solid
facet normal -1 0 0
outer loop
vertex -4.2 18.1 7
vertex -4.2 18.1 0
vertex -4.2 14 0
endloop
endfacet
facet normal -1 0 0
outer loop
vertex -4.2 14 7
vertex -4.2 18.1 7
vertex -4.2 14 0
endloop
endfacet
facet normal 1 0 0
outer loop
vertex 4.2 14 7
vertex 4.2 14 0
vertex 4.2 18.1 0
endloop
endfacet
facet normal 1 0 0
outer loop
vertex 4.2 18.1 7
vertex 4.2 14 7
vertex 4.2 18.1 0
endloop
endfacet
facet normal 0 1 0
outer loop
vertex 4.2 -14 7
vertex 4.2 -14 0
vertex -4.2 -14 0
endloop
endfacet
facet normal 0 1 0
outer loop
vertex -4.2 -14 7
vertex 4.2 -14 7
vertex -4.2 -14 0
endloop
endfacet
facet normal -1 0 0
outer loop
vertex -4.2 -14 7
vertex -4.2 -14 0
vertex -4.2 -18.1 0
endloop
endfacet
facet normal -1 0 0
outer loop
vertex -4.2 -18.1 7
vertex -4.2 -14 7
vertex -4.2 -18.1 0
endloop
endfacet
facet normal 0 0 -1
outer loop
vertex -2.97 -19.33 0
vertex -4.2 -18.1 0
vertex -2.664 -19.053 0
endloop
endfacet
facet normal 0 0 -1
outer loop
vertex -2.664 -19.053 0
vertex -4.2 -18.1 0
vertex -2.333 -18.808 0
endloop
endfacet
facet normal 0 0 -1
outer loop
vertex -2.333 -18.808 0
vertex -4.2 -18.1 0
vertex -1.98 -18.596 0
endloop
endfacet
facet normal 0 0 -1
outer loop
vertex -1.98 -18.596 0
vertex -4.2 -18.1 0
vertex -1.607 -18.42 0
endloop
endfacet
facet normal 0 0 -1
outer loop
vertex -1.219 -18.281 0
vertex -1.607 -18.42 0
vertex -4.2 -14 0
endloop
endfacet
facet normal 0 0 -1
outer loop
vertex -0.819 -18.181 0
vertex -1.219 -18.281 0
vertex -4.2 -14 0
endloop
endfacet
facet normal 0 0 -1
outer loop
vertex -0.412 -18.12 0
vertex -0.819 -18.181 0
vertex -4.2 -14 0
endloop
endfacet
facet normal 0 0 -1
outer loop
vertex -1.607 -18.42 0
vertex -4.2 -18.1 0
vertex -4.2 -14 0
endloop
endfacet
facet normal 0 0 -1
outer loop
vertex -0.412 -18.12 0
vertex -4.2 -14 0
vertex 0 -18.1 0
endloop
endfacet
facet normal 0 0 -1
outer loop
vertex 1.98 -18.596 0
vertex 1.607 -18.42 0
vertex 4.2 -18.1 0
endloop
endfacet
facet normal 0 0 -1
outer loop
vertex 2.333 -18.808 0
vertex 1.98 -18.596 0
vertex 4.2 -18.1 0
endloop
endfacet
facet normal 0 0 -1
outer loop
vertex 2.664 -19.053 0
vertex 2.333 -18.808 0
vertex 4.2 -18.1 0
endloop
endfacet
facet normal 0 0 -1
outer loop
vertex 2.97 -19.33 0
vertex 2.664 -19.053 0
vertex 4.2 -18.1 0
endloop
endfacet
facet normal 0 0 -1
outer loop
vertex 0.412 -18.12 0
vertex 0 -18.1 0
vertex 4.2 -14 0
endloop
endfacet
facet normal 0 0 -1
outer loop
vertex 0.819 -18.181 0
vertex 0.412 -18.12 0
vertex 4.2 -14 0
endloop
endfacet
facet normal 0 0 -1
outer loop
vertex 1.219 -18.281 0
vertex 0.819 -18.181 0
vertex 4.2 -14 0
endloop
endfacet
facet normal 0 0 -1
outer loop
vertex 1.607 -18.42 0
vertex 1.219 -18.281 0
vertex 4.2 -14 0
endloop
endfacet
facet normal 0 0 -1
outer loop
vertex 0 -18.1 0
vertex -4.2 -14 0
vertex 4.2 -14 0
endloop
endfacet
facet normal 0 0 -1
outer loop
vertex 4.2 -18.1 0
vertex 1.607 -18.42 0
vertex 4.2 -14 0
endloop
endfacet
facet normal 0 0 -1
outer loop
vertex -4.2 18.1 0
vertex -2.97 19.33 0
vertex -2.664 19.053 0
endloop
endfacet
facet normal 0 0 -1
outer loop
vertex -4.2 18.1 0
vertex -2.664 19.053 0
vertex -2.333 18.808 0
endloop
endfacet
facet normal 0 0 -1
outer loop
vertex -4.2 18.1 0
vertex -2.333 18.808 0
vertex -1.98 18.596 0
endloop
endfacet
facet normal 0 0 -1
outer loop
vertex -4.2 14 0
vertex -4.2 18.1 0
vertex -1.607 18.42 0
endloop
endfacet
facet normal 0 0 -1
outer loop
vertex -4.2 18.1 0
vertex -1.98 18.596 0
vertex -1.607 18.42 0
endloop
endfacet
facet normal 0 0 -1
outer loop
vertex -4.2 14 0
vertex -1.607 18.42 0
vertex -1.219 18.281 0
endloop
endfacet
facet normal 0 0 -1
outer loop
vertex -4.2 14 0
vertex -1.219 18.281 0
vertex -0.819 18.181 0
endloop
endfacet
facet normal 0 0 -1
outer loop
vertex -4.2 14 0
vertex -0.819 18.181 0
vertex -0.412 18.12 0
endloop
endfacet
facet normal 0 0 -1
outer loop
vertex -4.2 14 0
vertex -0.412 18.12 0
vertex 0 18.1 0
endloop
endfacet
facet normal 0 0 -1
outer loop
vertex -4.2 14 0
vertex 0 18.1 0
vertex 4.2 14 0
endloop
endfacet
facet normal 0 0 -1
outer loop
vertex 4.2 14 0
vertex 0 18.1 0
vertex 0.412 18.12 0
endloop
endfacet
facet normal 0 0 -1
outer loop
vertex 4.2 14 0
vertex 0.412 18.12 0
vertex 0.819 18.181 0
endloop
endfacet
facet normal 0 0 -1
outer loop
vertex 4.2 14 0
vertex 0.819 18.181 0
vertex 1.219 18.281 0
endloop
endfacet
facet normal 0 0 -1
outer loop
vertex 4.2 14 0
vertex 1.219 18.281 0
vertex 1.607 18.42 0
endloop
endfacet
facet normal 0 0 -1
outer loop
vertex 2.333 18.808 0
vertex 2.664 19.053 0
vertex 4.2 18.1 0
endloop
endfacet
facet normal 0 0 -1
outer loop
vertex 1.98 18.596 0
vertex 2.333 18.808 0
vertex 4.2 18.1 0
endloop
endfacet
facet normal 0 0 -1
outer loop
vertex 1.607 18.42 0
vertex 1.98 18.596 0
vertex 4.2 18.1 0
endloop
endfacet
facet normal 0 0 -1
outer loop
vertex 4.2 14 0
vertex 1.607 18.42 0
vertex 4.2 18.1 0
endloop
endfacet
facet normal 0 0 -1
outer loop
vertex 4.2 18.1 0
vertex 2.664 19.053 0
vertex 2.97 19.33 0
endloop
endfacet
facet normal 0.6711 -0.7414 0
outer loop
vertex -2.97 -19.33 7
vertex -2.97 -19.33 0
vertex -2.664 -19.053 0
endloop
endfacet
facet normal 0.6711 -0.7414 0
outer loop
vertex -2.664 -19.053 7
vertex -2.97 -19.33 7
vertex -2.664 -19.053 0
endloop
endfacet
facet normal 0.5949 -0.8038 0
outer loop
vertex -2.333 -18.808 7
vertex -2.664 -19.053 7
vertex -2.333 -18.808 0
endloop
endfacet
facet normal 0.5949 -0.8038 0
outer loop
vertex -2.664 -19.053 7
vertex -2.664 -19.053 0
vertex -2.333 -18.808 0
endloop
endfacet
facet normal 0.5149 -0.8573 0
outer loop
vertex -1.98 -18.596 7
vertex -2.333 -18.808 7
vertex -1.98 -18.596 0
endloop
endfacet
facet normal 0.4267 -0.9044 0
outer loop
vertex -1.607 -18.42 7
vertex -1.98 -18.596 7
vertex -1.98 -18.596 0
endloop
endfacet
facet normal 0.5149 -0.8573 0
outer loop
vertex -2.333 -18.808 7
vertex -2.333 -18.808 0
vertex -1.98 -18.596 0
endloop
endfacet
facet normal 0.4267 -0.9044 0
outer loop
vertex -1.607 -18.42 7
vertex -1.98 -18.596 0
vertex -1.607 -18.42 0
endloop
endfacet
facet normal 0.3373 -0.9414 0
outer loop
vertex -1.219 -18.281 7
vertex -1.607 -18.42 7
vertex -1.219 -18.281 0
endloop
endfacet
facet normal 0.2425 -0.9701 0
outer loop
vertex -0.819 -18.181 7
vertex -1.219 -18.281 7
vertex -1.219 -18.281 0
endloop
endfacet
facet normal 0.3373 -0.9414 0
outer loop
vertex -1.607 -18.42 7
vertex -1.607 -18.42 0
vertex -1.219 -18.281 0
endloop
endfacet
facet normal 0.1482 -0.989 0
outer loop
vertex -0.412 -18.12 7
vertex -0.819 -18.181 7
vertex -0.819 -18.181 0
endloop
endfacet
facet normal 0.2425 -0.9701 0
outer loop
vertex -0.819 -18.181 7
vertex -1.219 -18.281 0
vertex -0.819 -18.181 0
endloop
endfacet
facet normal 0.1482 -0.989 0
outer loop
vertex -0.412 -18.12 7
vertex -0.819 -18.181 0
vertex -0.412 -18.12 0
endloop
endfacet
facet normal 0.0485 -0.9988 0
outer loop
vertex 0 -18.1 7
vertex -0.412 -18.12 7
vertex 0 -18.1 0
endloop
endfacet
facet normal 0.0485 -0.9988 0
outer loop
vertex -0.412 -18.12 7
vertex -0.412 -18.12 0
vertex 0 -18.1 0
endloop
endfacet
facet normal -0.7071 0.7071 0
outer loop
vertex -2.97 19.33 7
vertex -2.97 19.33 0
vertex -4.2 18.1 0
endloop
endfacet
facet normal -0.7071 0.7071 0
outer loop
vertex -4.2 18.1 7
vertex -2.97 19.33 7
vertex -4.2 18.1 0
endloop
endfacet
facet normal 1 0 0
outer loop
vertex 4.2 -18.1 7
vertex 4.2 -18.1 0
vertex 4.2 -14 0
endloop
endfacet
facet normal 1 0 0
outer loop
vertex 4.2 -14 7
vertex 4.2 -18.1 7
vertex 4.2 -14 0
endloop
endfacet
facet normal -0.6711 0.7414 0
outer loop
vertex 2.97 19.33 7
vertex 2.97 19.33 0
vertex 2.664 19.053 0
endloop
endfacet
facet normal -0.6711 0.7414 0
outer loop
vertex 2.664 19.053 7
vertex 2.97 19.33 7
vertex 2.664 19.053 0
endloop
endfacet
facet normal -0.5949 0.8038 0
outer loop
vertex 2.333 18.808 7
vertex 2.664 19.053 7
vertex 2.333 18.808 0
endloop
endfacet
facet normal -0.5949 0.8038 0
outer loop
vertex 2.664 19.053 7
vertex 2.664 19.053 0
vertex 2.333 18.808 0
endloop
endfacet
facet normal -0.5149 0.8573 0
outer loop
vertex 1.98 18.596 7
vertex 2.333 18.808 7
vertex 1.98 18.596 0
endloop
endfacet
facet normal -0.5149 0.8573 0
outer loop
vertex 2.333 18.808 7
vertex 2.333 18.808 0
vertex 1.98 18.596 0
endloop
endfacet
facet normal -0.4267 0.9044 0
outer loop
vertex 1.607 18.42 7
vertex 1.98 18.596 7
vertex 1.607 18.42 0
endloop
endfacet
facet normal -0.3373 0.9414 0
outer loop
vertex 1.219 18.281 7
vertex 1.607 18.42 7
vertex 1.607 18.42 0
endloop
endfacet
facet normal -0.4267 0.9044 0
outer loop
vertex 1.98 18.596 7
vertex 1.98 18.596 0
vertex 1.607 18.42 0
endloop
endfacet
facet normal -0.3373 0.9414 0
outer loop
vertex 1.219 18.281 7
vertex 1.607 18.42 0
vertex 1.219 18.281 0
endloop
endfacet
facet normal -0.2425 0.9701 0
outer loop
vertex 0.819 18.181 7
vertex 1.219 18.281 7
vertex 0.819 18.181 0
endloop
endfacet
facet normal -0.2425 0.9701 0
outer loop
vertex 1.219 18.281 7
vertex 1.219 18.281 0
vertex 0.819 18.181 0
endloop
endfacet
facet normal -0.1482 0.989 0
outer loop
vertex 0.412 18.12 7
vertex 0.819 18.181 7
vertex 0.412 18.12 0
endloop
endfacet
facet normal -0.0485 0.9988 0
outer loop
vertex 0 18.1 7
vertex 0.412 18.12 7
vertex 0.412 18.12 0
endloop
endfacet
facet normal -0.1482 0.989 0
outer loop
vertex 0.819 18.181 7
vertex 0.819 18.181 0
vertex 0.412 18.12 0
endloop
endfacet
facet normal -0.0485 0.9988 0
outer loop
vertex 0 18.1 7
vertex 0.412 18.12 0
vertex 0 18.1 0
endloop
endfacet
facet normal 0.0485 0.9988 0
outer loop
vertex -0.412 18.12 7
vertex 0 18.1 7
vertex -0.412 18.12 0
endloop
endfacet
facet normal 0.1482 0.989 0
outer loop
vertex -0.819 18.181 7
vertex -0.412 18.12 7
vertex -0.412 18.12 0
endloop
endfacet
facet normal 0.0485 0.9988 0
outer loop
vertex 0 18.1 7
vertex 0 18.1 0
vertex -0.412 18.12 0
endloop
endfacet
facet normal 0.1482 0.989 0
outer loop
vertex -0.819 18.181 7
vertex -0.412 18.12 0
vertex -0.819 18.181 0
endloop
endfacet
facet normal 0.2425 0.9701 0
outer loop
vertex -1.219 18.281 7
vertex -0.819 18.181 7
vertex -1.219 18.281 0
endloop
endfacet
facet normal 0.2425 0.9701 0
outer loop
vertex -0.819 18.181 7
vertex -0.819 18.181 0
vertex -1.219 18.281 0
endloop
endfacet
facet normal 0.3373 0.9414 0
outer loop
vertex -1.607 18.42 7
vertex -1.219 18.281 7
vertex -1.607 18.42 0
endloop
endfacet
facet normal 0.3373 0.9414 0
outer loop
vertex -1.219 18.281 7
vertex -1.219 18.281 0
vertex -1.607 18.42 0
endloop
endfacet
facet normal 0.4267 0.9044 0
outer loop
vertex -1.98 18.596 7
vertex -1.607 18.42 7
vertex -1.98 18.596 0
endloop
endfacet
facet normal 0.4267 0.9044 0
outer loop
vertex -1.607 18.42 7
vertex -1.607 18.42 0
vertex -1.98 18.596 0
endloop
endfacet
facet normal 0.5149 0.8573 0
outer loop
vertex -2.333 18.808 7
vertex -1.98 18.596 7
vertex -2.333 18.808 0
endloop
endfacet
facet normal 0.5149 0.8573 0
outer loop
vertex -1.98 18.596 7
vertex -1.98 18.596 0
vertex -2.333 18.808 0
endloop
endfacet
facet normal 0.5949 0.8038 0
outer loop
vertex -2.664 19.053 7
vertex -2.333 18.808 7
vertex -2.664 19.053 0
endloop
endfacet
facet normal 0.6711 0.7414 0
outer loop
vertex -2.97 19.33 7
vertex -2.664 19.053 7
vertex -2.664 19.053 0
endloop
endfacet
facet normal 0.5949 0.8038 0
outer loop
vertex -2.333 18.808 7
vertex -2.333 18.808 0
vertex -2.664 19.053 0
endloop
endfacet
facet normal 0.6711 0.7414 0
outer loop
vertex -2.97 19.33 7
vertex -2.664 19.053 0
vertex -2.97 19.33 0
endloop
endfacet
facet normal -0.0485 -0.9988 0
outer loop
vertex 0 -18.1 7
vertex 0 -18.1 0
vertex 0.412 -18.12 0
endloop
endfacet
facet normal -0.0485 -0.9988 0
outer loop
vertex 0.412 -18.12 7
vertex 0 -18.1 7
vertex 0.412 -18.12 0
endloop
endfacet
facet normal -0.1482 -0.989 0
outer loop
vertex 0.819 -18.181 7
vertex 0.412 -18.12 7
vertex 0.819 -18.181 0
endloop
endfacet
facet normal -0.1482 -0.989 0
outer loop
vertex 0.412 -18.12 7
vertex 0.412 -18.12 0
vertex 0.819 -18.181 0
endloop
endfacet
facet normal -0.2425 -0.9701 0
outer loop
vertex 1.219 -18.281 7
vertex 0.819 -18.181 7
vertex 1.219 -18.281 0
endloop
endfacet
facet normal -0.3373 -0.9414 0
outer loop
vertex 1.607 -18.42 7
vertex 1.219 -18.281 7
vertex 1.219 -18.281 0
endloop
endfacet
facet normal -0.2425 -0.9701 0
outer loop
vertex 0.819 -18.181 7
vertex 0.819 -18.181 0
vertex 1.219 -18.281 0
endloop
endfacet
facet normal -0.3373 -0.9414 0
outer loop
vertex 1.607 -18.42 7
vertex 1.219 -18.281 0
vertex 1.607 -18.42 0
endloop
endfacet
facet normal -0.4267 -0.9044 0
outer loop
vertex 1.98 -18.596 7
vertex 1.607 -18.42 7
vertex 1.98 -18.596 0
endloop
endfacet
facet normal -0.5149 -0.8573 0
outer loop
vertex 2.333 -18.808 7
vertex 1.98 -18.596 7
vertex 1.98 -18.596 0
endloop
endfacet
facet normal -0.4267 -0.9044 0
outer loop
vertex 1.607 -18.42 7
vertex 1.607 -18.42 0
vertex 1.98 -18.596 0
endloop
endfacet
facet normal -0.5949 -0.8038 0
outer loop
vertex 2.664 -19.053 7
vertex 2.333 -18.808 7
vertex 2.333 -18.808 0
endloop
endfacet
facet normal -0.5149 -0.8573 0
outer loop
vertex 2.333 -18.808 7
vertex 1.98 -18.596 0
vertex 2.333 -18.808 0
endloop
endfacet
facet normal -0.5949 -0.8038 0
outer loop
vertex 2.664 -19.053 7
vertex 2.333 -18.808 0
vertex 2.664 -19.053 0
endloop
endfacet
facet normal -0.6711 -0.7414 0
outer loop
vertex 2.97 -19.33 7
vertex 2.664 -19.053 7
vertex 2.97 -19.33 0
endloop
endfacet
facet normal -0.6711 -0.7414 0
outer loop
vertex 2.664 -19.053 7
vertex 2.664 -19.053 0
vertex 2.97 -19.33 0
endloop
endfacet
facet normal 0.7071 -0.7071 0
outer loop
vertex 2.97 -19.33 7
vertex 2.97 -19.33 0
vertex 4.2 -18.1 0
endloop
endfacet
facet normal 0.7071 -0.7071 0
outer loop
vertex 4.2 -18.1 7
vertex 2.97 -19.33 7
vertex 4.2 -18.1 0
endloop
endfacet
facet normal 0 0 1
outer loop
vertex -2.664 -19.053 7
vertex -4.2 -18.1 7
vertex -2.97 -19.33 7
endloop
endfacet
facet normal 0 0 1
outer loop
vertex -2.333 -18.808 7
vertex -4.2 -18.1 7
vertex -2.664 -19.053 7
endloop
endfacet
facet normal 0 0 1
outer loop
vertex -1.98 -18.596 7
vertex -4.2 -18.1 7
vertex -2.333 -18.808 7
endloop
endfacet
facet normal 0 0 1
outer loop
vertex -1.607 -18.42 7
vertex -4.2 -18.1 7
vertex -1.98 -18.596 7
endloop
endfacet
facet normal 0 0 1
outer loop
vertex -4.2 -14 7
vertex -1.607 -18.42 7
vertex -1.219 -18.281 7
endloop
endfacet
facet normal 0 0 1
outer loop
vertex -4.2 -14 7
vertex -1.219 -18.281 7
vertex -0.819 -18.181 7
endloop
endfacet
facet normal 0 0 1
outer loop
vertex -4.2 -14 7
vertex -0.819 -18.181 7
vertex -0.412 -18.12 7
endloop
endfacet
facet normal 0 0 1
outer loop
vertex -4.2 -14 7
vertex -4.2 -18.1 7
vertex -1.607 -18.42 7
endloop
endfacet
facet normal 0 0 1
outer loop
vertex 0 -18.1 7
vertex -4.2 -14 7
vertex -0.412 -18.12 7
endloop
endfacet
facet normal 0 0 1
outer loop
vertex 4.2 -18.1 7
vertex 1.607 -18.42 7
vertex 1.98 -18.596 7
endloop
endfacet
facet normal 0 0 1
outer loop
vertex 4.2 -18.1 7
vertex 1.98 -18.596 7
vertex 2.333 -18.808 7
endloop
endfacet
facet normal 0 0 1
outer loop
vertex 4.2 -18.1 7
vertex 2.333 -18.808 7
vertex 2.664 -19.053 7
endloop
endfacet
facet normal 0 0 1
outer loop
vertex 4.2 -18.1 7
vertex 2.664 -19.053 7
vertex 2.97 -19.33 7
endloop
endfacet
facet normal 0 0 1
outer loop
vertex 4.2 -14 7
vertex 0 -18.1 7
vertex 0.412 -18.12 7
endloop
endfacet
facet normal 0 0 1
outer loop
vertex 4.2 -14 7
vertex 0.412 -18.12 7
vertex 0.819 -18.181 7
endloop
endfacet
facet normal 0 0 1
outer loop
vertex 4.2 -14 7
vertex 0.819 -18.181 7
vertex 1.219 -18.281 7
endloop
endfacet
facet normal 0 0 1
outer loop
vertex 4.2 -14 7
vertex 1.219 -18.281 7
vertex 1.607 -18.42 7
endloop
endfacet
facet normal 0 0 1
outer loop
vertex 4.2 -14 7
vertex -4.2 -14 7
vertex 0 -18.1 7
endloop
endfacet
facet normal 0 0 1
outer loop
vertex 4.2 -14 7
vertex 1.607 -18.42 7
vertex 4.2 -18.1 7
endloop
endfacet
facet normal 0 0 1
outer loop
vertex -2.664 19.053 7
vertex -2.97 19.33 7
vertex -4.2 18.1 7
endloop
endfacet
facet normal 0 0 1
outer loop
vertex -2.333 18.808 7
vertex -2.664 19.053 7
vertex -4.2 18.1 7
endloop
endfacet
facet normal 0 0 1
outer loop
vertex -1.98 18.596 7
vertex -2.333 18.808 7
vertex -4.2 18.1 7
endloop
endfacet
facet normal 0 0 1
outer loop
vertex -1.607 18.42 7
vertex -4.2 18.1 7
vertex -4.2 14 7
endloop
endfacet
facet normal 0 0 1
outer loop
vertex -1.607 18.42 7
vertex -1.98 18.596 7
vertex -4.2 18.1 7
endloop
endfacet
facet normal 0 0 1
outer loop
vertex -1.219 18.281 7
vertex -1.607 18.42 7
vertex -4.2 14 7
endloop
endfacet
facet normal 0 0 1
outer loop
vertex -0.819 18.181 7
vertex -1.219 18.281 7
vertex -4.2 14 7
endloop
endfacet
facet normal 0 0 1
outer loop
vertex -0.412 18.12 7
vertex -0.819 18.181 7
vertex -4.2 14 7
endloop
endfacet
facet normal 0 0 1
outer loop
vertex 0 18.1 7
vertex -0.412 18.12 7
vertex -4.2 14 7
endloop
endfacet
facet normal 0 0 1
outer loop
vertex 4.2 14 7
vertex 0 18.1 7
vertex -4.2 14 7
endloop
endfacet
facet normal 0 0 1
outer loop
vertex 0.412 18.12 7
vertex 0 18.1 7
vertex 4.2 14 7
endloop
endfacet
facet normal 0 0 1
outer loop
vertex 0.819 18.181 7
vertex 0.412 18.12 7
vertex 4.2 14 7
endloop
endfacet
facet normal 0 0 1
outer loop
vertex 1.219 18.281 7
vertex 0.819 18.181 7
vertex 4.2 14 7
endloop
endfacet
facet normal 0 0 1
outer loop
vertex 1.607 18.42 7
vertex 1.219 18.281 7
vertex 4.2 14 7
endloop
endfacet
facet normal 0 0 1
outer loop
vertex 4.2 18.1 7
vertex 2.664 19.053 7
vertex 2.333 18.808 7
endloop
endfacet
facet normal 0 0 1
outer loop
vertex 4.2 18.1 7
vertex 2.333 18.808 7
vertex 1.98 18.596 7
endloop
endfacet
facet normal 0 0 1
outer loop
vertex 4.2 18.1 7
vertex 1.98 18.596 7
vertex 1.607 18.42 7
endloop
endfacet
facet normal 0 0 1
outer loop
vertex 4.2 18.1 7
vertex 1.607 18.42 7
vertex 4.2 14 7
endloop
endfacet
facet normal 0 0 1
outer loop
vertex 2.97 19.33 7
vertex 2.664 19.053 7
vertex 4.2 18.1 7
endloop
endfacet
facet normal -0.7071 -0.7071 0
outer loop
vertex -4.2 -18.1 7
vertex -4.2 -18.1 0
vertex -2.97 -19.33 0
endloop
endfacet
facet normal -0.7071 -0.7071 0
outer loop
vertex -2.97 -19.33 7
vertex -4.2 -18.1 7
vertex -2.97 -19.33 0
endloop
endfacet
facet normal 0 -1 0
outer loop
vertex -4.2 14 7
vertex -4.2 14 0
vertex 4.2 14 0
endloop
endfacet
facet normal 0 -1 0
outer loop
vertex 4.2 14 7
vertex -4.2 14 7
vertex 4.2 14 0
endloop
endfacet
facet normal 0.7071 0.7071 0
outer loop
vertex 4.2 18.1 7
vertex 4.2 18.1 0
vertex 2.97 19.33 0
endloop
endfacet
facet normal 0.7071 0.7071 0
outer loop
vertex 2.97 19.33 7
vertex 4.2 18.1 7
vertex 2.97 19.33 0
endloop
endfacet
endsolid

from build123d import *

# Parameters (mm, degrees)
F1_DEPTH = 7


# Not quite as in the source:
# - a feature names something its author has since deleted; it is built from what else it names


with BuildPart() as f1:
    # F0 (on Top) → F1 (new body)
    with BuildSketch(Plane.XY):
        with BuildLine():
            Line((4.2, -18.1), (4.2, -14))
            Line((4.2, -14), (0, -14))
            Line((0, -14), (0, -18.1))
            ThreePointArc((0, -18.1), (1.6072704159, -18.4197059635), (2.969848481, -19.330151519))
            Line((2.969848481, -19.330151519), (4.2, -18.1))
        make_face()
        with BuildLine():
            Line((0, -14), (-4.2, -14))
            Line((-4.2, -14), (-4.2, -18.1))
            Line((-4.2, -18.1), (-2.969848481, -19.330151519))
            ThreePointArc((-2.969848481, -19.330151519), (-1.6072704159, -18.4197059635), (0, -18.1))
            Line((0, -18.1), (0, -14))
        make_face()
    extrude(amount=F1_DEPTH)


with BuildPart() as f1b:
    # F0 (on Top) → F1, piece 2 (new body)
    with BuildSketch(Plane.XY):
        with BuildLine():
            Line((4.2, 14), (4.2, 18.1))
            Line((4.2, 18.1), (2.969848481, 19.330151519))
            ThreePointArc((2.969848481, 19.330151519), (0, 18.1), (-2.969848481, 19.330151519))
            Line((-2.969848481, 19.330151519), (-4.2, 18.1))
            Line((-4.2, 18.1), (-4.2, 14))
            Line((-4.2, 14), (4.2, 14))
        make_face()
    extrude(amount=F1_DEPTH)


solid = Compound([f1.part, f1b.part])
